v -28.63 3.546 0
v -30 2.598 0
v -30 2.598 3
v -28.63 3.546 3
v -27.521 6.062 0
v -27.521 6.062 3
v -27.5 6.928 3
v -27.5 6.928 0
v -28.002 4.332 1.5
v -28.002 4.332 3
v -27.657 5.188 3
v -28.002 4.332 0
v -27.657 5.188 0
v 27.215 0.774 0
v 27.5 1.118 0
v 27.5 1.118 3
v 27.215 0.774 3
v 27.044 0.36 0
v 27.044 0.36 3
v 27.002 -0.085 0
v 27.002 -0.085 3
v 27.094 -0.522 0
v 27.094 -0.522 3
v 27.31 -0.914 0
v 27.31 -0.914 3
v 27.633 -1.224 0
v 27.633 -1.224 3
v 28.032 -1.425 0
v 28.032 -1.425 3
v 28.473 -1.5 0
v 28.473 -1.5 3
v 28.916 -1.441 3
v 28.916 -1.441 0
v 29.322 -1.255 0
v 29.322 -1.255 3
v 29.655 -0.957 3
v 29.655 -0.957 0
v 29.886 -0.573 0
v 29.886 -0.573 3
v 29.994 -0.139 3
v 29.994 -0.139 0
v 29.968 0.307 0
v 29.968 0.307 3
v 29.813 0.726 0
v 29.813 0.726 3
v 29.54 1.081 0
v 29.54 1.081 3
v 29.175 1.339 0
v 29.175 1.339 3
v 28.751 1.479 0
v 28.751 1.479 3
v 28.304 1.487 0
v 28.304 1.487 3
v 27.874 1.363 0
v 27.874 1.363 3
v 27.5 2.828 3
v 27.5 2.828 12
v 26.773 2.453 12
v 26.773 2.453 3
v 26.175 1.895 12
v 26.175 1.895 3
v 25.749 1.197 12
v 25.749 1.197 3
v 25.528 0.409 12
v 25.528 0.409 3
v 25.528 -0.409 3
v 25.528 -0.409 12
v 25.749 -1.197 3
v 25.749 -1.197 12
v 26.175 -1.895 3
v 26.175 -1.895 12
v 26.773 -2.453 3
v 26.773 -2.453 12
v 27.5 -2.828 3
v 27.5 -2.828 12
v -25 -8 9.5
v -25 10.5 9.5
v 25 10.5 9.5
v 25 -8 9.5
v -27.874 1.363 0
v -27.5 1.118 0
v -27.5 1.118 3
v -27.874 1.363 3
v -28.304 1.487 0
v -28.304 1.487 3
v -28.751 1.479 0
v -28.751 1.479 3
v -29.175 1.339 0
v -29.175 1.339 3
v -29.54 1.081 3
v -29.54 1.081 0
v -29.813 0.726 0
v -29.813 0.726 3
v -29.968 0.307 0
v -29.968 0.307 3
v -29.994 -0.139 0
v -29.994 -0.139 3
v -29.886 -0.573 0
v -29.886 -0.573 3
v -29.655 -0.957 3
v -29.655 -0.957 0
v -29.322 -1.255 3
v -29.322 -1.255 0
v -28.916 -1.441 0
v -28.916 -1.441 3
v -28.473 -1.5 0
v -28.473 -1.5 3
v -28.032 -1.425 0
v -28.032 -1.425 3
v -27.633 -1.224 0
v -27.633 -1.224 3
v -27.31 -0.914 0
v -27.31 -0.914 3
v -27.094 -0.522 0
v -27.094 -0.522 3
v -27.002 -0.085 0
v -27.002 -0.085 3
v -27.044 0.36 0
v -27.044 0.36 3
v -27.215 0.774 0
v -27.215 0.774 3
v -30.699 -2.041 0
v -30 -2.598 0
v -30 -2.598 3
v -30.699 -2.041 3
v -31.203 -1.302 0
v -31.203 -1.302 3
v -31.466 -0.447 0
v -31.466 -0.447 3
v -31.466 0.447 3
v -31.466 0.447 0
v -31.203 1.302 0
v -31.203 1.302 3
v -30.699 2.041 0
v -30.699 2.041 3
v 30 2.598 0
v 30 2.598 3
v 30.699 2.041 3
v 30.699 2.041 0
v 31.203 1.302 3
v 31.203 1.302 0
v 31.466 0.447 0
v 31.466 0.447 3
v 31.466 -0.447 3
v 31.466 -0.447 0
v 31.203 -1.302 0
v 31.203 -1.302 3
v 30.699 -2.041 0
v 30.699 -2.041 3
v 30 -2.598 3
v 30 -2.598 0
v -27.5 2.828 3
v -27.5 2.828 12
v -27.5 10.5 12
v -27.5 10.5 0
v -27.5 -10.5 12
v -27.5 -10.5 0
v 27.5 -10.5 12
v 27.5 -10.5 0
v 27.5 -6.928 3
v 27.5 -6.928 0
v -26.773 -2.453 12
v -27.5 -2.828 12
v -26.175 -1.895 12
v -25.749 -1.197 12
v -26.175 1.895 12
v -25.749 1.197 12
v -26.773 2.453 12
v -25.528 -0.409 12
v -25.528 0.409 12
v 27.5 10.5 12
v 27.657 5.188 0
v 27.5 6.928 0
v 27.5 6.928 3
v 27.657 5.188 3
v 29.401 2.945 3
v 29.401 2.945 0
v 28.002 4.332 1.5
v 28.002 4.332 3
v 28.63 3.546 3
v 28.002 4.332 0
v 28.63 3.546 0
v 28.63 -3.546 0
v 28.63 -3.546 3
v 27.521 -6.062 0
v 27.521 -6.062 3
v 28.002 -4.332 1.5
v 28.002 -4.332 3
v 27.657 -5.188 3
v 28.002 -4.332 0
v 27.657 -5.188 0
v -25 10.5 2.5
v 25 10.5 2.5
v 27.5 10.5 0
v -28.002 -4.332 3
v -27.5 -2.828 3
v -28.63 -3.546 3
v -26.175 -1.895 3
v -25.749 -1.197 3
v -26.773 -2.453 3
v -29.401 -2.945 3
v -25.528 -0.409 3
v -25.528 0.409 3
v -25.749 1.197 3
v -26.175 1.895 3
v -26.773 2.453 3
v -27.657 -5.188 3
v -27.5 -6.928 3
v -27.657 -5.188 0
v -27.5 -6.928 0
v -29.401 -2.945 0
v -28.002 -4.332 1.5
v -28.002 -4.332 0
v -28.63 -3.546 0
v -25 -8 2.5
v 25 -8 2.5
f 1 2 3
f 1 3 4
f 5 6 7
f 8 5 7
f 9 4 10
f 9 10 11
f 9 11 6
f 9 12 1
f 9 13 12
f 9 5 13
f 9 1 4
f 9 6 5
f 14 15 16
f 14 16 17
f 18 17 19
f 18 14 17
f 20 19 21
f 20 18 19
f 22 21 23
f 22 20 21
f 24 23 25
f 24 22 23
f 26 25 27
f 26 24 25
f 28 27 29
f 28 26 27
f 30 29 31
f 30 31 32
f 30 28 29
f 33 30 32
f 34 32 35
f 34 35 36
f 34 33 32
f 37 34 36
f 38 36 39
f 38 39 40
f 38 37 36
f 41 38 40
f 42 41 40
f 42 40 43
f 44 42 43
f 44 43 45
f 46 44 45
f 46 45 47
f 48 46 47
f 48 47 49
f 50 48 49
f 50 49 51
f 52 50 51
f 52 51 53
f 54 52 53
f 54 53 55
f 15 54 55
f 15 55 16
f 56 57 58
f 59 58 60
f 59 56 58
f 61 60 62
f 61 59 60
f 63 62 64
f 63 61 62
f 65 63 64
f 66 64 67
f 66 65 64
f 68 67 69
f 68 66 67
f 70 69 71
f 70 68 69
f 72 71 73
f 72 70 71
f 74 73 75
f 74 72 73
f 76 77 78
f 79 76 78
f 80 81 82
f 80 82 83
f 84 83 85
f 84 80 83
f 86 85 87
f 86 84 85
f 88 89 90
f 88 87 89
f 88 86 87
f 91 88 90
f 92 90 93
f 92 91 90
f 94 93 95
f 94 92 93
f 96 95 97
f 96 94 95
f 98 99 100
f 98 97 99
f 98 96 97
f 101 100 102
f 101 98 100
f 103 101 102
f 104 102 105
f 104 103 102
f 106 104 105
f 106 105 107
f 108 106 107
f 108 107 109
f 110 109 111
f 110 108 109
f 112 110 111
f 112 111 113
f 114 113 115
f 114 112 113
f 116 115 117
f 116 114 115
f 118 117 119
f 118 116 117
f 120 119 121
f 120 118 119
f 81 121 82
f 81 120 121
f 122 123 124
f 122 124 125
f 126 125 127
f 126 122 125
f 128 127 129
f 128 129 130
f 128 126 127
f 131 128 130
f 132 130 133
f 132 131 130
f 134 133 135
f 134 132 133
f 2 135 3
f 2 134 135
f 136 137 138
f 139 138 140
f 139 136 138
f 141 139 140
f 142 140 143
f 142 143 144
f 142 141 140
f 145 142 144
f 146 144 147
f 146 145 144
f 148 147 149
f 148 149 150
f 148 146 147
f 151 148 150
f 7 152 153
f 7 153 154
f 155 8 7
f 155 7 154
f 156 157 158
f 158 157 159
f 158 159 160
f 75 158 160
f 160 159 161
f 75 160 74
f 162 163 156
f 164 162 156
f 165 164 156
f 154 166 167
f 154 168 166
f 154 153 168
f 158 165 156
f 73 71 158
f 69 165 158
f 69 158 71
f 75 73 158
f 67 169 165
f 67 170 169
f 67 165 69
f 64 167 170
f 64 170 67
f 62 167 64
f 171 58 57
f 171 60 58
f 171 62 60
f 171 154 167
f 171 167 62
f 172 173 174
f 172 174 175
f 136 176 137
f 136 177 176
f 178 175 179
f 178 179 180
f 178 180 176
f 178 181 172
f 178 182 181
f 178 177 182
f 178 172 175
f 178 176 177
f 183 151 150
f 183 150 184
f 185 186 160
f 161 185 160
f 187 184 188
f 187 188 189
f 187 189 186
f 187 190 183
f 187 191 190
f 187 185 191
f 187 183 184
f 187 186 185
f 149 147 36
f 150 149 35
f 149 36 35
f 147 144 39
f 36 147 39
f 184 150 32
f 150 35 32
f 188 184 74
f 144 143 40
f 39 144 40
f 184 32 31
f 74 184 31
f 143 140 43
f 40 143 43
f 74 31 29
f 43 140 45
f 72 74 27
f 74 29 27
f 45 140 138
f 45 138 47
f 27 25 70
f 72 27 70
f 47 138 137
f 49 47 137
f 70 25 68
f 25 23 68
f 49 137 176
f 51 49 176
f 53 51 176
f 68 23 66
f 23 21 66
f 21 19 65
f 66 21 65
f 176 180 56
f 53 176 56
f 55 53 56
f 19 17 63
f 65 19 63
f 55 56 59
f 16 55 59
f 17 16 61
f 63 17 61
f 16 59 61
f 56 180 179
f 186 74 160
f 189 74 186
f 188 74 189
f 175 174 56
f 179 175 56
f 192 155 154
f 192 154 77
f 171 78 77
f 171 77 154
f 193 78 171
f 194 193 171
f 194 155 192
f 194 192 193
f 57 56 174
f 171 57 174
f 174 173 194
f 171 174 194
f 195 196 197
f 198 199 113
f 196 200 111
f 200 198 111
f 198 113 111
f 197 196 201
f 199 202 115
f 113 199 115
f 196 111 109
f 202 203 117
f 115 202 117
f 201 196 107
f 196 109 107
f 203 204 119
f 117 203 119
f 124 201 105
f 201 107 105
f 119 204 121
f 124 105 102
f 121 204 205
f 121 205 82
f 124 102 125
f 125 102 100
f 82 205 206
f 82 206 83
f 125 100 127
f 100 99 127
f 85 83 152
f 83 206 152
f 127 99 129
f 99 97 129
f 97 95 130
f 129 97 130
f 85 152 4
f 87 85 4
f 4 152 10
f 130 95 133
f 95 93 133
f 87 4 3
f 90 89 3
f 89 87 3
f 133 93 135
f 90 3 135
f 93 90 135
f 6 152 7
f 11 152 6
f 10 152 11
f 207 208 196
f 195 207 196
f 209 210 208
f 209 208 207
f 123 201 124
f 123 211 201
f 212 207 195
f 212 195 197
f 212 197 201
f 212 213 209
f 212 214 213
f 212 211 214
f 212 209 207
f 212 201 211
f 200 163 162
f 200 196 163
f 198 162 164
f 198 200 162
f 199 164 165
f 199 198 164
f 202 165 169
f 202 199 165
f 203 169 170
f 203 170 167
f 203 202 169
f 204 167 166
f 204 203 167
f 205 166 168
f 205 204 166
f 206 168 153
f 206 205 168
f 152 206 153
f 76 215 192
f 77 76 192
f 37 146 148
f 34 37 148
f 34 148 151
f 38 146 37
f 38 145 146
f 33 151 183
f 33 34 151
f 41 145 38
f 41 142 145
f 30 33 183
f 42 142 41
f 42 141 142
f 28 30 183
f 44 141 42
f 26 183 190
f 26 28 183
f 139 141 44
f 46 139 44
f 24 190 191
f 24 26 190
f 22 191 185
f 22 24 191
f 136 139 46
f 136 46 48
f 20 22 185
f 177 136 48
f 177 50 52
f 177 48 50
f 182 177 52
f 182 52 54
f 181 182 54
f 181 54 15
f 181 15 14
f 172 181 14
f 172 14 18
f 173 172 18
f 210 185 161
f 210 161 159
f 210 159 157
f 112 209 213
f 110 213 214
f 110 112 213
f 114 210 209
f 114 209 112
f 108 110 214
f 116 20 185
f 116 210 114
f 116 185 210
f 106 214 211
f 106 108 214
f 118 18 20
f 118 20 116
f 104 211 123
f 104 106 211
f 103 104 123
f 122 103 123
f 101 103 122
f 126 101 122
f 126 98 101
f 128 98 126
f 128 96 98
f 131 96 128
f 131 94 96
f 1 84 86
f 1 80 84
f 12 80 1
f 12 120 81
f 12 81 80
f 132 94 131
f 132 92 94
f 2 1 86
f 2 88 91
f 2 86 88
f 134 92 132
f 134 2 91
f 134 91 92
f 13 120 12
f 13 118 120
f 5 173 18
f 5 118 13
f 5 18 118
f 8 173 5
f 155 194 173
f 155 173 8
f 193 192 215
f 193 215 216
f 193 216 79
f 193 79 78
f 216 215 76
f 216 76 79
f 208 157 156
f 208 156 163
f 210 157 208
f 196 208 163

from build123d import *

# Parameters (mm, degrees)
SKETCH1_W               = 55
SKETCH1_H               = 21
BOSS_EXTRUDE1_DEPTH     = 12
SHELL1_T                = -2.5
SKETCH2_R               = 3
BOSS_EXTRUDE2_DEPTH     = 3
CUT_EXTRUDE1_DEPTH      = 30
CUT_EXTRUDE1_DEPTH_BACK = 5
SKETCH3_R               = 1.5
CUT_EXTRUDE5_START      = -9
SKETCH4_R               = 3
CUT_EXTRUDE5_DEPTH      = 9
FILLET1_DEPTH           = 3


with BuildPart() as part:
    # Sketch1 → Boss-Extrude1 (new body)
    with BuildSketch(Plane.XY):
        Rectangle(SKETCH1_W, SKETCH1_H)
    extrude(amount=BOSS_EXTRUDE1_DEPTH)

    # Shell1
    shell1_openings = [part.faces().sort_by_distance(p)[0] for p in [
        (0, 10.5, 6),
    ]]
    offset(amount=SHELL1_T, openings=shell1_openings, kind=Kind.INTERSECTION)

    # Sketch2 → Boss-Extrude2 (add)
    with BuildSketch(Plane(origin=(0, 0, 0), x_dir=(-1, 0, 0), z_dir=(0, 0, -1))):
        with Locations((28.5, 0)):
            Circle(SKETCH2_R)
        with Locations((-28.5, 0)):
            Circle(SKETCH2_R)
    extrude(amount=-BOSS_EXTRUDE2_DEPTH)

    # Sketch3 → Cut-Extrude1 (cut, two sides: drawn at the far end of the back side and taken through both)
    with BuildSketch(Plane.XY.offset(3).offset(-CUT_EXTRUDE1_DEPTH_BACK)):
        with Locations(Location((-28.5, 0, 0), (0, 0, 48.189685104))):
            Circle(SKETCH3_R)
        with Locations(Location((28.5, 0, 0), (0, 0, 131.810314896))):
            Circle(SKETCH3_R)
    extrude(amount=CUT_EXTRUDE1_DEPTH + CUT_EXTRUDE1_DEPTH_BACK, mode=Mode.SUBTRACT)

    # Sketch4 → Cut-Extrude5 (cut)
    with BuildSketch(Plane.XY.offset(12).offset(CUT_EXTRUDE5_START)):
        with Locations((-28.5, 0)):
            Circle(SKETCH4_R)
        with Locations((28.5, 0)):
            Circle(SKETCH4_R)
    extrude(amount=CUT_EXTRUDE5_DEPTH, mode=Mode.SUBTRACT)

    # Fillet1: read off the stored shape, not the designer's step
    # Fillet1 outline → Fillet1 (add)
    with BuildSketch(Plane.XY):
        with BuildLine():
            add(Edge.make_bspline(
                [(30, -2.598076211), (29.735280722, -2.750911958), (29.325654839, -2.942455607), (28.108593688, -3.775872627), (27.622600662, -4.829914939), (27.5, -5.892304845), (27.5, -6.410254038), (27.5, -6.92820323)],
                knots=[0, 0, 0, 0, 0, 0, 0.5, 0.5, 1, 1, 1, 1, 1, 1], degree=5))
            ThreePointArc((30, -2.598076211), (28.775255129, -2.987345748), (27.5, -2.828427125))
            Line((27.5, -2.828427125), (27.5, -6.92820323))
        make_face()
        with BuildLine():
            add(Edge.make_bspline(
                [(27.5, 6.92820323), (27.5, 6.410254038), (27.5, 5.892304845), (27.622600662, 4.829914939), (28.108593688, 3.775872627), (29.325654839, 2.942455607), (29.735280722, 2.750911958), (30, 2.598076211)],
                knots=[0, 0, 0, 0, 0, 0, 0.5, 0.5, 1, 1, 1, 1, 1, 1], degree=5))
            Line((27.5, 6.92820323), (27.5, 2.828427125))
            ThreePointArc((27.5, 2.828427125), (28.775255129, 2.987345748), (30, 2.598076211))
        make_face()
        with BuildLine():
            add(Edge.make_bspline(
                [(-30, 2.598076211), (-29.735280722, 2.750911958), (-29.325654839, 2.942455607), (-28.108593688, 3.775872627), (-27.622600662, 4.829914939), (-27.5, 5.892304845), (-27.5, 6.410254038), (-27.5, 6.92820323)],
                knots=[0, 0, 0, 0, 0, 0, 0.5, 0.5, 1, 1, 1, 1, 1, 1], degree=5))
            ThreePointArc((-30, 2.598076211), (-28.775255129, 2.987345748), (-27.5, 2.828427125))
            Line((-27.5, 2.828427125), (-27.5, 6.92820323))
        make_face()
        with BuildLine():
            add(Edge.make_bspline(
                [(-27.5, -6.92820323), (-27.5, -6.410254038), (-27.5, -5.892304845), (-27.622600662, -4.829914939), (-28.108593688, -3.775872627), (-29.325654839, -2.942455607), (-29.735280722, -2.750911958), (-30, -2.598076211)],
                knots=[0, 0, 0, 0, 0, 0, 0.5, 0.5, 1, 1, 1, 1, 1, 1], degree=5))
            Line((-27.5, -6.92820323), (-27.5, -2.828427125))
            ThreePointArc((-27.5, -2.828427125), (-28.775255129, -2.987345748), (-30, -2.598076211))
        make_face()
    extrude(amount=FILLET1_DEPTH)


solid = part.part
